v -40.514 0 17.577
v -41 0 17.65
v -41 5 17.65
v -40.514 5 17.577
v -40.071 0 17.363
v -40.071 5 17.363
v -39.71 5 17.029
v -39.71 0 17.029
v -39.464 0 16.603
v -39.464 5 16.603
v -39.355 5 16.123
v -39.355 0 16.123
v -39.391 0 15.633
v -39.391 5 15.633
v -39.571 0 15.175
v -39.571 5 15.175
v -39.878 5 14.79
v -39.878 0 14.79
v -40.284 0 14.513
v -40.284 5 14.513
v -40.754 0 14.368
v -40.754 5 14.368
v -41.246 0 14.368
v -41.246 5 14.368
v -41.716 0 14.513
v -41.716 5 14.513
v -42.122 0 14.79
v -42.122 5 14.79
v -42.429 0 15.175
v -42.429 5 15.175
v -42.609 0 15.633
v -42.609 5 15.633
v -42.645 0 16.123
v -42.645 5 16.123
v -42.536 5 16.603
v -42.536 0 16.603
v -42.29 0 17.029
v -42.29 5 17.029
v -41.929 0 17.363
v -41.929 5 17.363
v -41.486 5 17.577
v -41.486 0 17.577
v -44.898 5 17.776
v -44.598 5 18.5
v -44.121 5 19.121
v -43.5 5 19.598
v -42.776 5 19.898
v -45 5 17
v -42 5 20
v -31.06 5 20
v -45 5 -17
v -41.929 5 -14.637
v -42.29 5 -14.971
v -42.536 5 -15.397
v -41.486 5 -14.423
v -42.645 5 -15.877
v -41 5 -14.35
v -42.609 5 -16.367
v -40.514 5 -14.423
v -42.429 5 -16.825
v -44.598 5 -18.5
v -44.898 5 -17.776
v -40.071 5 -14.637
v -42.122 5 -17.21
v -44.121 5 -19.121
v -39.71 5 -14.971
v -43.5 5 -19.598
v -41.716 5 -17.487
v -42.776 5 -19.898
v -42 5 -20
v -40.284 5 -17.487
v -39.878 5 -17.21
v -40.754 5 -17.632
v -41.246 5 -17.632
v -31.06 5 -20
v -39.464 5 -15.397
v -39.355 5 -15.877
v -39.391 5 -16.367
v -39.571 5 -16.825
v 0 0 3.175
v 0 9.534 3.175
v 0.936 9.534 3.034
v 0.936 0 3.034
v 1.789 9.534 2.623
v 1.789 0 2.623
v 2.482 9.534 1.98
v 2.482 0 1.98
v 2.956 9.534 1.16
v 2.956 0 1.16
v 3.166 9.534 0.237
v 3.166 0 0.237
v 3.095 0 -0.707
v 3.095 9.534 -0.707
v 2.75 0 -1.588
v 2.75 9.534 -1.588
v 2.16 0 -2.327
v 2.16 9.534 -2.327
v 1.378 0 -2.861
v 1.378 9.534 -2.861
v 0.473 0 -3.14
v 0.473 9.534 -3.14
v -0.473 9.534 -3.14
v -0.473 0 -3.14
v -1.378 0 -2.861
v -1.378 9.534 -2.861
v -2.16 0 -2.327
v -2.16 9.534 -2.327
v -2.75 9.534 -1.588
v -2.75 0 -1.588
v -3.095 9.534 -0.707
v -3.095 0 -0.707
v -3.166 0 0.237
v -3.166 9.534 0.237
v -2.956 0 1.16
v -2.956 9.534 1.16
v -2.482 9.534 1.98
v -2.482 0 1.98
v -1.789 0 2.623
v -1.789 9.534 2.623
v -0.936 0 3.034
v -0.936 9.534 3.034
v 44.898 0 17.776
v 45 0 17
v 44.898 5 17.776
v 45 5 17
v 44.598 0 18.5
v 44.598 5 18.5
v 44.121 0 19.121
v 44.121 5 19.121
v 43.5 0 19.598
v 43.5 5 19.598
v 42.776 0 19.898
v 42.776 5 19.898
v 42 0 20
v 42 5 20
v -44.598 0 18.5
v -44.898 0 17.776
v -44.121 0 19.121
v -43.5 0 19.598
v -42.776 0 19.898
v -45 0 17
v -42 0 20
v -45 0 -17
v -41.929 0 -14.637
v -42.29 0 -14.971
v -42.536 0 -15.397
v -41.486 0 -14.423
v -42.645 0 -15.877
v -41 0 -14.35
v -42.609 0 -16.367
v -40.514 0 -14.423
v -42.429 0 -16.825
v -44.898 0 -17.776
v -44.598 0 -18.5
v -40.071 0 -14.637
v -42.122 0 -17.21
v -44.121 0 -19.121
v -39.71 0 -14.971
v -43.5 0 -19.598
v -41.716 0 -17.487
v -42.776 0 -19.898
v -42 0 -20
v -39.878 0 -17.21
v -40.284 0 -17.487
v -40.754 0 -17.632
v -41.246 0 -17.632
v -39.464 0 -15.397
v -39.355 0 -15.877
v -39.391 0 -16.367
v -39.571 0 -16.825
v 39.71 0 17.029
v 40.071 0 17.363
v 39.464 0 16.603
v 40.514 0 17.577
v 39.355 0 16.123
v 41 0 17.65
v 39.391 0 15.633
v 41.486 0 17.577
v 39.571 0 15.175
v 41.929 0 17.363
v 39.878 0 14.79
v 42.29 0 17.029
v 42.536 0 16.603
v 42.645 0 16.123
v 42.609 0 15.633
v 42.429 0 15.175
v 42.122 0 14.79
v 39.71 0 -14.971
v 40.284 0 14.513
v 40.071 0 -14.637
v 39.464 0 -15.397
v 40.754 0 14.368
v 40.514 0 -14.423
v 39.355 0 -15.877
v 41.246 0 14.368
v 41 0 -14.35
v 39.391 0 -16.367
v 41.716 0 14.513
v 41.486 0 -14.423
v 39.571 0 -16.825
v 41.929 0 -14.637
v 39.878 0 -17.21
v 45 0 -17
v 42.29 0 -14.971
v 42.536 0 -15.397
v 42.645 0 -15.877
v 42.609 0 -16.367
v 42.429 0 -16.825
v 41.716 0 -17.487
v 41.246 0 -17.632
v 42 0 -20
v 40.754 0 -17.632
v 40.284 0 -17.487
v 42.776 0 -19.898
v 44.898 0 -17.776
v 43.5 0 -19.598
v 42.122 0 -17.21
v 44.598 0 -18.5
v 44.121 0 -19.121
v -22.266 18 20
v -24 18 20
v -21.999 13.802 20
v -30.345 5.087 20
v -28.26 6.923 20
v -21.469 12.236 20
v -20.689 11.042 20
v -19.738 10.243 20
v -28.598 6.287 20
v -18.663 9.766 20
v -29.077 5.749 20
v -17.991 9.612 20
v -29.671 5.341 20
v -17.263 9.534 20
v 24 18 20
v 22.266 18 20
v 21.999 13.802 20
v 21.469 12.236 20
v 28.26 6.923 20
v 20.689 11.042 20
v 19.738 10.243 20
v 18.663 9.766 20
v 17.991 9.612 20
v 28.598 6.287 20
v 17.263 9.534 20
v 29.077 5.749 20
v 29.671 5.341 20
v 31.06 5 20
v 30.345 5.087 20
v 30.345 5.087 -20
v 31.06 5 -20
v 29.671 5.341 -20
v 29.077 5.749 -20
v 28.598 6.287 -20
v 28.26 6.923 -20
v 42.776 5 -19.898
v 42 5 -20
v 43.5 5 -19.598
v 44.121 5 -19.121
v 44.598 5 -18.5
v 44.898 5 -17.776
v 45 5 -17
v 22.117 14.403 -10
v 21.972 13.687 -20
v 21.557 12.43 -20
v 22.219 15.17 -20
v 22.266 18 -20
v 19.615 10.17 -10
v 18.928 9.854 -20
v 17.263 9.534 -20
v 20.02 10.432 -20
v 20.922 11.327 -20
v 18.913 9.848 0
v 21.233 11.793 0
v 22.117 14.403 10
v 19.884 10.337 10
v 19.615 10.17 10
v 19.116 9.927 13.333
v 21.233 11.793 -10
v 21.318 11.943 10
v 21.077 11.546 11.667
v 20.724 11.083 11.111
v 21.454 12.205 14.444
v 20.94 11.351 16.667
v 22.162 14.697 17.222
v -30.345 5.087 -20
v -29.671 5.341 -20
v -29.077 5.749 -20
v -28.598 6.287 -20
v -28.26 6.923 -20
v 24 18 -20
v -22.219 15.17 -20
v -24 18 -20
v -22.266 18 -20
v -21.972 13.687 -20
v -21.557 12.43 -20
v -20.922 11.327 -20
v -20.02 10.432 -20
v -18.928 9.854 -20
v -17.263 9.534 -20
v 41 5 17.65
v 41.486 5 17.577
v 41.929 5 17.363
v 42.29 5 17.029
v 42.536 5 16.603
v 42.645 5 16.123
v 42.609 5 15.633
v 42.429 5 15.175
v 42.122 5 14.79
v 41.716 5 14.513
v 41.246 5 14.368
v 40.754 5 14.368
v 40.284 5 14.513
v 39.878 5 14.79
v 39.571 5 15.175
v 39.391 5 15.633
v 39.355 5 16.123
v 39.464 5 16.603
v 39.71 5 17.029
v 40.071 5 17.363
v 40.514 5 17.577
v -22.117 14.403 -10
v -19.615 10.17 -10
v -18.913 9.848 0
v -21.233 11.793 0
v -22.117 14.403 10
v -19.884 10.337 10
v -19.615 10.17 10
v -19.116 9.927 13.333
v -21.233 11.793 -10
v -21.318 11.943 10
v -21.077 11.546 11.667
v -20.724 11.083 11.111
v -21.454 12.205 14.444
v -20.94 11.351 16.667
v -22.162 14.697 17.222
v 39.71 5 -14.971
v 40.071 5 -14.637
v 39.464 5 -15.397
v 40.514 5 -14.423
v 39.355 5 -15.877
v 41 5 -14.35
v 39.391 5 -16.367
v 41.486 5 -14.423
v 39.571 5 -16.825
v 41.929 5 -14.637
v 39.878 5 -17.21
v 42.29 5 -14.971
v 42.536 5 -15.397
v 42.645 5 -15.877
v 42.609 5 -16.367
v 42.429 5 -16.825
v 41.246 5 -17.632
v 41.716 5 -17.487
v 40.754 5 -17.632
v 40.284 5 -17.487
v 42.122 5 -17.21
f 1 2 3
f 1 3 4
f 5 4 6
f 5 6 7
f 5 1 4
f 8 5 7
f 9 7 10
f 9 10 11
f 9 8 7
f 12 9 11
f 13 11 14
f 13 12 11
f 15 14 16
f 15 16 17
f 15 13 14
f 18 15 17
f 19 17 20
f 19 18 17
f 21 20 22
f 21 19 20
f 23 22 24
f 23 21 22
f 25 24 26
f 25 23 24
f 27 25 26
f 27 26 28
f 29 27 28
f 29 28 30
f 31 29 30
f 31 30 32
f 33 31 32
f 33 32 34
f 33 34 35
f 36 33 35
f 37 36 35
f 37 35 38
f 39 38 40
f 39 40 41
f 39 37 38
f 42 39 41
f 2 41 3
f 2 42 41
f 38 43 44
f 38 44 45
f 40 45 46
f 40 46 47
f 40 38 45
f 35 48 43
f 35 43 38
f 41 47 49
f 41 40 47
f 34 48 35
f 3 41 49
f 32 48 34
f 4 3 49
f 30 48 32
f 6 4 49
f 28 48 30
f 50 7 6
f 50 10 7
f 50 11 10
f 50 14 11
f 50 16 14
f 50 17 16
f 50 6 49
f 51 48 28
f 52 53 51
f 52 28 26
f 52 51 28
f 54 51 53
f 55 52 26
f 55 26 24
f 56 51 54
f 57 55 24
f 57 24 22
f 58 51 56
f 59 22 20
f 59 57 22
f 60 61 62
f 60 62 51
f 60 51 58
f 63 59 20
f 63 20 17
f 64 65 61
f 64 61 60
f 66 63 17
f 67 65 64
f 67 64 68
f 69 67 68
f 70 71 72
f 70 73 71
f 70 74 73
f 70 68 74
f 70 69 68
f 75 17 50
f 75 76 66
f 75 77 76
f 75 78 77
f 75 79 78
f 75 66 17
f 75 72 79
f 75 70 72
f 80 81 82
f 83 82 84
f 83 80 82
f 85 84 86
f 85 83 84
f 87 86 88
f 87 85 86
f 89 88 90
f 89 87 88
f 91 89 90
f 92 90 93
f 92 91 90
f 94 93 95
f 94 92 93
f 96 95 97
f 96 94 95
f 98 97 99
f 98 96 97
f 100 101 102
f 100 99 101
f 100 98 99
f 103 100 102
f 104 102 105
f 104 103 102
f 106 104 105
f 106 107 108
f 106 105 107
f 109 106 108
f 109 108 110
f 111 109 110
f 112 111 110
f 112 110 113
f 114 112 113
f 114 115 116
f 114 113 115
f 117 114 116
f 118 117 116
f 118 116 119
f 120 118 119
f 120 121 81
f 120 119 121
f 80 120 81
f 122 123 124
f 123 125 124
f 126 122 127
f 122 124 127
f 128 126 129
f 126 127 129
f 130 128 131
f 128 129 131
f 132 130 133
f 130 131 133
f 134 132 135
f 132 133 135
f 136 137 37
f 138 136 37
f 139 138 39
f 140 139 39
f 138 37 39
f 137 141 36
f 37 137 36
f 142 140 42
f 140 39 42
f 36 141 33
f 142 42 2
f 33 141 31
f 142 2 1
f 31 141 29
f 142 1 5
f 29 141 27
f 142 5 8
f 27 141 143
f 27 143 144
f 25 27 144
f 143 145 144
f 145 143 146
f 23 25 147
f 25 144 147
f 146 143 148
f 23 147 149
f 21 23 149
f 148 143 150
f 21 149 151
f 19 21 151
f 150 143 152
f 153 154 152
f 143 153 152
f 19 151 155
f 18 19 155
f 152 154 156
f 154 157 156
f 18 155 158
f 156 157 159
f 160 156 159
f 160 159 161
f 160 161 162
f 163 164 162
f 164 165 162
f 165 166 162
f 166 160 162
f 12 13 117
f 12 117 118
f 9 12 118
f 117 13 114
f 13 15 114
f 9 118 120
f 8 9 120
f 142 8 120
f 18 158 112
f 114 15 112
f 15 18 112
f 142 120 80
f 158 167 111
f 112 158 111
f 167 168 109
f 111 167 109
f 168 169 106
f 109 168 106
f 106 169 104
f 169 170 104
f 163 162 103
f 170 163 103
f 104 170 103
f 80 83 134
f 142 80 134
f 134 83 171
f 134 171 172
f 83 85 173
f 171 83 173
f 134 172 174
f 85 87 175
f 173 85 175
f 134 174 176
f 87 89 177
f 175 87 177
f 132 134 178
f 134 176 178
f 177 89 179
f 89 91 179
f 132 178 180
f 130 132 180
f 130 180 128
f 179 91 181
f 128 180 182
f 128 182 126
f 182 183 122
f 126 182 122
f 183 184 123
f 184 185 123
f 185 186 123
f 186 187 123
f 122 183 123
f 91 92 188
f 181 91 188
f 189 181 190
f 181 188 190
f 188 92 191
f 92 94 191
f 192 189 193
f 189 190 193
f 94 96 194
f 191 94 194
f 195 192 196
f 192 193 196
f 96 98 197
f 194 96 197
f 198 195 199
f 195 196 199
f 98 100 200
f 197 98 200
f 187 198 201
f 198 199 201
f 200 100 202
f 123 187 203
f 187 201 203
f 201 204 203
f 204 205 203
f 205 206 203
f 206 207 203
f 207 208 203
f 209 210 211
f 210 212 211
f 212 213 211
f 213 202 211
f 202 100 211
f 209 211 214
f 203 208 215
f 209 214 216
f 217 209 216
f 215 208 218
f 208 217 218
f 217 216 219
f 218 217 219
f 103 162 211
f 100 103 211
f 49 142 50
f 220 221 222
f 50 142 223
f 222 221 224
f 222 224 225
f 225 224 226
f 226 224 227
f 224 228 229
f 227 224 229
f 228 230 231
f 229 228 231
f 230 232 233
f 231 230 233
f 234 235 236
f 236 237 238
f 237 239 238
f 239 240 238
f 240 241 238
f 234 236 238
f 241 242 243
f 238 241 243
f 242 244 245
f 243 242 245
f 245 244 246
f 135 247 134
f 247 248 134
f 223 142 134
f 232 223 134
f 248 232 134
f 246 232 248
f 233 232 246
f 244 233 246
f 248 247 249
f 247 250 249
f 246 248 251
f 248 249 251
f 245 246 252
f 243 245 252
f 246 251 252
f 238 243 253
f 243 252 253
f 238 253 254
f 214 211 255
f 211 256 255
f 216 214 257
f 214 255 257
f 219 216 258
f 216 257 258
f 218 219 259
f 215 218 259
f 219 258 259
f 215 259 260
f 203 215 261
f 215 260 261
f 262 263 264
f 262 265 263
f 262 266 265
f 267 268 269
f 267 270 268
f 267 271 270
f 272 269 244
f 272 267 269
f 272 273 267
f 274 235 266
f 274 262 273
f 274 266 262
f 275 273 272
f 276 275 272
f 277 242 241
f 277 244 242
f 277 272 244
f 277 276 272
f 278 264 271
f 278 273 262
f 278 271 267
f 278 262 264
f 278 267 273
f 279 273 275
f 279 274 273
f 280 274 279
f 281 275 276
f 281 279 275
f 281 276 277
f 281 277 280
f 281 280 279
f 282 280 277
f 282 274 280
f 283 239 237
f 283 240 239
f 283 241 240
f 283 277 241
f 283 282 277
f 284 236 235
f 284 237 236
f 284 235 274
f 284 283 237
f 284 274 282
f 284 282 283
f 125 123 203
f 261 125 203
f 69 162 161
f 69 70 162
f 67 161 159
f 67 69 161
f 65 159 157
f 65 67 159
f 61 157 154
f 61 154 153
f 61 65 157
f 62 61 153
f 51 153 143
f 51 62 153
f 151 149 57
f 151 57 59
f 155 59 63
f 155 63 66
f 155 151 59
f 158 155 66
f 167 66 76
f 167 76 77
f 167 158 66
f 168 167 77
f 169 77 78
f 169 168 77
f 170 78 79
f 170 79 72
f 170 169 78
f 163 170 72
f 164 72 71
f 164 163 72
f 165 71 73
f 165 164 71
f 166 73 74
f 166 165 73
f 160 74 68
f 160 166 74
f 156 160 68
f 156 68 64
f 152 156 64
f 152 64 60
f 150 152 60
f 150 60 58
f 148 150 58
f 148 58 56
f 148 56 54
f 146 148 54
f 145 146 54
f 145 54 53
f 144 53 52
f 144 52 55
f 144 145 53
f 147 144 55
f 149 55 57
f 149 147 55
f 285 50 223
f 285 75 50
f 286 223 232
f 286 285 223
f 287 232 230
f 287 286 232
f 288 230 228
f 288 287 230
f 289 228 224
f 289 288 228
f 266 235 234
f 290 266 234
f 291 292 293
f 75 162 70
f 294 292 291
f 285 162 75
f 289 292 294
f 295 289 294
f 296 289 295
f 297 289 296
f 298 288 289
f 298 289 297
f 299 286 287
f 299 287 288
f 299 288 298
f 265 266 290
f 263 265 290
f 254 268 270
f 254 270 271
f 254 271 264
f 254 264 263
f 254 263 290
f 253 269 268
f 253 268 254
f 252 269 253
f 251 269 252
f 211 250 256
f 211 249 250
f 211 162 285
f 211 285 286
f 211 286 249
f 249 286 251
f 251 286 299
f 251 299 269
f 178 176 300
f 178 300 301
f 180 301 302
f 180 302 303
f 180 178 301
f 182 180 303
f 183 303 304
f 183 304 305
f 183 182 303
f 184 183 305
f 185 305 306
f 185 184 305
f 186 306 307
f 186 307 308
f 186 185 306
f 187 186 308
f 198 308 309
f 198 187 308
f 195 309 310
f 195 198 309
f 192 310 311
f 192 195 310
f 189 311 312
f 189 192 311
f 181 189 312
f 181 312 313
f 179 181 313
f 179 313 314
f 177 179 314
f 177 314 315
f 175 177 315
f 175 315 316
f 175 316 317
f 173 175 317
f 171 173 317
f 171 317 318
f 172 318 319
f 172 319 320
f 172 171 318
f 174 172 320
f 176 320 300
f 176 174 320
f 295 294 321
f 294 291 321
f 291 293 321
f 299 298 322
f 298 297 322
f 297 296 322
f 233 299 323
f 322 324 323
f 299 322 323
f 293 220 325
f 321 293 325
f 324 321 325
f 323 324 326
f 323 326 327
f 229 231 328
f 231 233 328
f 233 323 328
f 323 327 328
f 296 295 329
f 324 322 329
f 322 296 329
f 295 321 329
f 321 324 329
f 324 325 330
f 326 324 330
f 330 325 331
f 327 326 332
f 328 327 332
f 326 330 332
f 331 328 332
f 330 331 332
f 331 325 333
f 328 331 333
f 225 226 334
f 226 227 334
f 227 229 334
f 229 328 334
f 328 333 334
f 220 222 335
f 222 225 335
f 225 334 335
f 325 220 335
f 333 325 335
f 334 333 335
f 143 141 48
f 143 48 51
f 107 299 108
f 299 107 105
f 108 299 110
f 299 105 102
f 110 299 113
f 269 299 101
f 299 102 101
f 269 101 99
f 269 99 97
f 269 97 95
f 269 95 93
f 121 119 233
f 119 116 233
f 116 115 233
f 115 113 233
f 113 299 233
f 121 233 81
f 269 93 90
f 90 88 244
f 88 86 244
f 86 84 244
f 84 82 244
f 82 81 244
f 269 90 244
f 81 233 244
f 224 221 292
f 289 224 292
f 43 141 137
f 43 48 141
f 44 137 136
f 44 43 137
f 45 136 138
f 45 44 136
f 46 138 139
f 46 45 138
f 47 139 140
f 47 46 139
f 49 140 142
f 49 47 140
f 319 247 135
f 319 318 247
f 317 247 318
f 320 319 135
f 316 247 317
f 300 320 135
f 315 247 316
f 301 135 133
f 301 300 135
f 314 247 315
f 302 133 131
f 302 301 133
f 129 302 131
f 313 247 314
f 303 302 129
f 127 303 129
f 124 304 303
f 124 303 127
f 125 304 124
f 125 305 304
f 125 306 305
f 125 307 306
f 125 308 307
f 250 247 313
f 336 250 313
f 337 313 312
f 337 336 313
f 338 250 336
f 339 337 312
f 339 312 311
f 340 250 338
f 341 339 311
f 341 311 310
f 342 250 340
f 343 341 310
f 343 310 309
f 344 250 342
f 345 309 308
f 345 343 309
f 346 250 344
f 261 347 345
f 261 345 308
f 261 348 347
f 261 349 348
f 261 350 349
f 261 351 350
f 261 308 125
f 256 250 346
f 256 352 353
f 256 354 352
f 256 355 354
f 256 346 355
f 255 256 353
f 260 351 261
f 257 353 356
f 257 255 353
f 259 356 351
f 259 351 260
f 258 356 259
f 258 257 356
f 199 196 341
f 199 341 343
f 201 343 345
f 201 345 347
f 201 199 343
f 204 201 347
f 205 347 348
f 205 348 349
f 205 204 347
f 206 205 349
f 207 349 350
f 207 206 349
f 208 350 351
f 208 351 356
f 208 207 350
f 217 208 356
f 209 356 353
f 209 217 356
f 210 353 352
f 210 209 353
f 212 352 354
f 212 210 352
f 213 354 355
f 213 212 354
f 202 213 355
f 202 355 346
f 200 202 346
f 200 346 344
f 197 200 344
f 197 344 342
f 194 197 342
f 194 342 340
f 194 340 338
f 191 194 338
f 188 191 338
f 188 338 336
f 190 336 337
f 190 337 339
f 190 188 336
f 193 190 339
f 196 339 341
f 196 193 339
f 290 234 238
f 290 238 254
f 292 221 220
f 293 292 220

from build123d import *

# Parameters (mm, degrees)
CROQUIS1_W                = 21
CROQUIS1_H                = 40
CROQUIS1_R                = 1.65
SALIENTE_EXTRUIR1_DEPTH   = 5
SALIENTE_EXTRUIR1_2_DEPTH = 5
CROQUIS1_3_W              = 48
CROQUIS1_3_H              = 40
CROQUIS1_3_R              = 3.175
SALIENTE_EXTRUIR2_DEPTH   = 18
CORTAR_EXTRUIR1_DEPTH     = 52
CHAFL_N1_SIZE2            = 13
CHAFL_N1_SIZE             = 5
CHAFL_N2_SIZE2            = 13
CHAFL_N2_SIZE             = 5
REDONDEO1_R               = 3
REDONDEO2_R               = 3


with BuildPart() as part:
    # Croquis1 → Saliente-Extruir1 (new body)
    with BuildSketch(Plane(origin=(0, 0, 0), x_dir=(1, 0, 0), z_dir=(0, 1, 0))):
        with Locations((-34.5, 0)):
            Rectangle(CROQUIS1_W, CROQUIS1_H)
        with Locations(Location((-41, -16, 0), (0, 0, 270))):
            Circle(CROQUIS1_R, mode=Mode.SUBTRACT)
        with Locations(Location((-41, 16, 0), (0, 0, 270))):
            Circle(CROQUIS1_R, mode=Mode.SUBTRACT)
    extrude(amount=SALIENTE_EXTRUIR1_DEPTH)



with BuildPart() as body_2:
    # Croquis1 → Saliente-Extruir1 2 (new body)
    with BuildSketch(Plane(origin=(0, 0, 0), x_dir=(1, 0, 0), z_dir=(0, 1, 0))):
        with Locations((34.5, 0)):
            Rectangle(CROQUIS1_W, CROQUIS1_H)
        with Locations(Location((41, -16, 0), (0, 0, 270))):
            Circle(CROQUIS1_R, mode=Mode.SUBTRACT)
        with Locations(Location((41, 16, 0), (0, 0, 270))):
            Circle(CROQUIS1_R, mode=Mode.SUBTRACT)
    extrude(amount=SALIENTE_EXTRUIR1_2_DEPTH)


with BuildPart() as part_1:
    add(part.part)

    add(body_2.part)  # Saliente-Extruir2 merges body 2
    # Croquis1<3> → Saliente-Extruir2 (add)
    with BuildSketch(Plane(origin=(0, 0, 0), x_dir=(1, 0, 0), z_dir=(0, 1, 0))):
        Rectangle(CROQUIS1_3_W, CROQUIS1_3_H)
        with Locations(Location((0, 0, 0), (0, 0, 270))):
            Circle(CROQUIS1_3_R, mode=Mode.SUBTRACT)
    extrude(amount=SALIENTE_EXTRUIR2_DEPTH)

    # Croquis2 → Cortar-Extruir1 (cut)
    with BuildSketch(Plane.XY.offset(20)):
        with BuildLine():
            Line((-17.262904506, 9.533811896), (17.262904506, 9.533811896))
            add(Edge.make_bspline(
                [(22.266442187, 18), (22.701537977, 9.819720853), (17.262904506, 9.533811896)],
                knots=[0, 0, 0, 1, 1, 1], degree=2))
            Line((22.266442187, 18), (-22.266442187, 18))
            add(Edge.make_bspline(
                [(-22.266442187, 18), (-22.701537977, 9.819720853), (-17.262904506, 9.533811896)],
                knots=[0, 0, 0, 1, 1, 1], degree=2))
        make_face()
    extrude(amount=-CORTAR_EXTRUIR1_DEPTH, mode=Mode.SUBTRACT)

    # Chaflán1
    chafl_n1_edges = [part_1.edges().sort_by_distance(p)[0] for p in [
        (-24, 5, 0),
    ]]
    chafl_n1_side = [part_1.faces().sort_by_distance(p)[0] for p in [
        (-24.1, 5, 0),
    ]]
    chamfer(chafl_n1_edges, length=CHAFL_N1_SIZE - 0.0001, length2=CHAFL_N1_SIZE2 - 0.0001, reference=chafl_n1_side[0])  # a hair under: the kernel refuses the full size

    # Chaflán2
    chafl_n2_edges = [part_1.edges().sort_by_distance(p)[0] for p in [
        (24, 5, 0),
    ]]
    chafl_n2_side = [part_1.faces().sort_by_distance(p)[0] for p in [
        (24.1, 5, 0),
    ]]
    chamfer(chafl_n2_edges, length=CHAFL_N2_SIZE - 0.0001, length2=CHAFL_N2_SIZE2 - 0.0001, reference=chafl_n2_side[0])  # a hair under: the kernel refuses the full size

    # Redondeo1
    redondeo1_edges = [part_1.edges().sort_by_distance(p)[0] for p in [
        (-28.9999, 5, 0),
        (28.9999, 5, 0),
    ]]
    fillet(redondeo1_edges, radius=REDONDEO1_R)

    # Redondeo2
    redondeo2_edges = [part_1.edges().sort_by_distance(p)[0] for p in [
        (-45, 2.5, 20),
        (-45, 2.5, -20),
        (45, 2.5, -20),
        (45, 2.5, 20),
    ]]
    fillet(redondeo2_edges, radius=REDONDEO2_R)


solid = part_1.part
